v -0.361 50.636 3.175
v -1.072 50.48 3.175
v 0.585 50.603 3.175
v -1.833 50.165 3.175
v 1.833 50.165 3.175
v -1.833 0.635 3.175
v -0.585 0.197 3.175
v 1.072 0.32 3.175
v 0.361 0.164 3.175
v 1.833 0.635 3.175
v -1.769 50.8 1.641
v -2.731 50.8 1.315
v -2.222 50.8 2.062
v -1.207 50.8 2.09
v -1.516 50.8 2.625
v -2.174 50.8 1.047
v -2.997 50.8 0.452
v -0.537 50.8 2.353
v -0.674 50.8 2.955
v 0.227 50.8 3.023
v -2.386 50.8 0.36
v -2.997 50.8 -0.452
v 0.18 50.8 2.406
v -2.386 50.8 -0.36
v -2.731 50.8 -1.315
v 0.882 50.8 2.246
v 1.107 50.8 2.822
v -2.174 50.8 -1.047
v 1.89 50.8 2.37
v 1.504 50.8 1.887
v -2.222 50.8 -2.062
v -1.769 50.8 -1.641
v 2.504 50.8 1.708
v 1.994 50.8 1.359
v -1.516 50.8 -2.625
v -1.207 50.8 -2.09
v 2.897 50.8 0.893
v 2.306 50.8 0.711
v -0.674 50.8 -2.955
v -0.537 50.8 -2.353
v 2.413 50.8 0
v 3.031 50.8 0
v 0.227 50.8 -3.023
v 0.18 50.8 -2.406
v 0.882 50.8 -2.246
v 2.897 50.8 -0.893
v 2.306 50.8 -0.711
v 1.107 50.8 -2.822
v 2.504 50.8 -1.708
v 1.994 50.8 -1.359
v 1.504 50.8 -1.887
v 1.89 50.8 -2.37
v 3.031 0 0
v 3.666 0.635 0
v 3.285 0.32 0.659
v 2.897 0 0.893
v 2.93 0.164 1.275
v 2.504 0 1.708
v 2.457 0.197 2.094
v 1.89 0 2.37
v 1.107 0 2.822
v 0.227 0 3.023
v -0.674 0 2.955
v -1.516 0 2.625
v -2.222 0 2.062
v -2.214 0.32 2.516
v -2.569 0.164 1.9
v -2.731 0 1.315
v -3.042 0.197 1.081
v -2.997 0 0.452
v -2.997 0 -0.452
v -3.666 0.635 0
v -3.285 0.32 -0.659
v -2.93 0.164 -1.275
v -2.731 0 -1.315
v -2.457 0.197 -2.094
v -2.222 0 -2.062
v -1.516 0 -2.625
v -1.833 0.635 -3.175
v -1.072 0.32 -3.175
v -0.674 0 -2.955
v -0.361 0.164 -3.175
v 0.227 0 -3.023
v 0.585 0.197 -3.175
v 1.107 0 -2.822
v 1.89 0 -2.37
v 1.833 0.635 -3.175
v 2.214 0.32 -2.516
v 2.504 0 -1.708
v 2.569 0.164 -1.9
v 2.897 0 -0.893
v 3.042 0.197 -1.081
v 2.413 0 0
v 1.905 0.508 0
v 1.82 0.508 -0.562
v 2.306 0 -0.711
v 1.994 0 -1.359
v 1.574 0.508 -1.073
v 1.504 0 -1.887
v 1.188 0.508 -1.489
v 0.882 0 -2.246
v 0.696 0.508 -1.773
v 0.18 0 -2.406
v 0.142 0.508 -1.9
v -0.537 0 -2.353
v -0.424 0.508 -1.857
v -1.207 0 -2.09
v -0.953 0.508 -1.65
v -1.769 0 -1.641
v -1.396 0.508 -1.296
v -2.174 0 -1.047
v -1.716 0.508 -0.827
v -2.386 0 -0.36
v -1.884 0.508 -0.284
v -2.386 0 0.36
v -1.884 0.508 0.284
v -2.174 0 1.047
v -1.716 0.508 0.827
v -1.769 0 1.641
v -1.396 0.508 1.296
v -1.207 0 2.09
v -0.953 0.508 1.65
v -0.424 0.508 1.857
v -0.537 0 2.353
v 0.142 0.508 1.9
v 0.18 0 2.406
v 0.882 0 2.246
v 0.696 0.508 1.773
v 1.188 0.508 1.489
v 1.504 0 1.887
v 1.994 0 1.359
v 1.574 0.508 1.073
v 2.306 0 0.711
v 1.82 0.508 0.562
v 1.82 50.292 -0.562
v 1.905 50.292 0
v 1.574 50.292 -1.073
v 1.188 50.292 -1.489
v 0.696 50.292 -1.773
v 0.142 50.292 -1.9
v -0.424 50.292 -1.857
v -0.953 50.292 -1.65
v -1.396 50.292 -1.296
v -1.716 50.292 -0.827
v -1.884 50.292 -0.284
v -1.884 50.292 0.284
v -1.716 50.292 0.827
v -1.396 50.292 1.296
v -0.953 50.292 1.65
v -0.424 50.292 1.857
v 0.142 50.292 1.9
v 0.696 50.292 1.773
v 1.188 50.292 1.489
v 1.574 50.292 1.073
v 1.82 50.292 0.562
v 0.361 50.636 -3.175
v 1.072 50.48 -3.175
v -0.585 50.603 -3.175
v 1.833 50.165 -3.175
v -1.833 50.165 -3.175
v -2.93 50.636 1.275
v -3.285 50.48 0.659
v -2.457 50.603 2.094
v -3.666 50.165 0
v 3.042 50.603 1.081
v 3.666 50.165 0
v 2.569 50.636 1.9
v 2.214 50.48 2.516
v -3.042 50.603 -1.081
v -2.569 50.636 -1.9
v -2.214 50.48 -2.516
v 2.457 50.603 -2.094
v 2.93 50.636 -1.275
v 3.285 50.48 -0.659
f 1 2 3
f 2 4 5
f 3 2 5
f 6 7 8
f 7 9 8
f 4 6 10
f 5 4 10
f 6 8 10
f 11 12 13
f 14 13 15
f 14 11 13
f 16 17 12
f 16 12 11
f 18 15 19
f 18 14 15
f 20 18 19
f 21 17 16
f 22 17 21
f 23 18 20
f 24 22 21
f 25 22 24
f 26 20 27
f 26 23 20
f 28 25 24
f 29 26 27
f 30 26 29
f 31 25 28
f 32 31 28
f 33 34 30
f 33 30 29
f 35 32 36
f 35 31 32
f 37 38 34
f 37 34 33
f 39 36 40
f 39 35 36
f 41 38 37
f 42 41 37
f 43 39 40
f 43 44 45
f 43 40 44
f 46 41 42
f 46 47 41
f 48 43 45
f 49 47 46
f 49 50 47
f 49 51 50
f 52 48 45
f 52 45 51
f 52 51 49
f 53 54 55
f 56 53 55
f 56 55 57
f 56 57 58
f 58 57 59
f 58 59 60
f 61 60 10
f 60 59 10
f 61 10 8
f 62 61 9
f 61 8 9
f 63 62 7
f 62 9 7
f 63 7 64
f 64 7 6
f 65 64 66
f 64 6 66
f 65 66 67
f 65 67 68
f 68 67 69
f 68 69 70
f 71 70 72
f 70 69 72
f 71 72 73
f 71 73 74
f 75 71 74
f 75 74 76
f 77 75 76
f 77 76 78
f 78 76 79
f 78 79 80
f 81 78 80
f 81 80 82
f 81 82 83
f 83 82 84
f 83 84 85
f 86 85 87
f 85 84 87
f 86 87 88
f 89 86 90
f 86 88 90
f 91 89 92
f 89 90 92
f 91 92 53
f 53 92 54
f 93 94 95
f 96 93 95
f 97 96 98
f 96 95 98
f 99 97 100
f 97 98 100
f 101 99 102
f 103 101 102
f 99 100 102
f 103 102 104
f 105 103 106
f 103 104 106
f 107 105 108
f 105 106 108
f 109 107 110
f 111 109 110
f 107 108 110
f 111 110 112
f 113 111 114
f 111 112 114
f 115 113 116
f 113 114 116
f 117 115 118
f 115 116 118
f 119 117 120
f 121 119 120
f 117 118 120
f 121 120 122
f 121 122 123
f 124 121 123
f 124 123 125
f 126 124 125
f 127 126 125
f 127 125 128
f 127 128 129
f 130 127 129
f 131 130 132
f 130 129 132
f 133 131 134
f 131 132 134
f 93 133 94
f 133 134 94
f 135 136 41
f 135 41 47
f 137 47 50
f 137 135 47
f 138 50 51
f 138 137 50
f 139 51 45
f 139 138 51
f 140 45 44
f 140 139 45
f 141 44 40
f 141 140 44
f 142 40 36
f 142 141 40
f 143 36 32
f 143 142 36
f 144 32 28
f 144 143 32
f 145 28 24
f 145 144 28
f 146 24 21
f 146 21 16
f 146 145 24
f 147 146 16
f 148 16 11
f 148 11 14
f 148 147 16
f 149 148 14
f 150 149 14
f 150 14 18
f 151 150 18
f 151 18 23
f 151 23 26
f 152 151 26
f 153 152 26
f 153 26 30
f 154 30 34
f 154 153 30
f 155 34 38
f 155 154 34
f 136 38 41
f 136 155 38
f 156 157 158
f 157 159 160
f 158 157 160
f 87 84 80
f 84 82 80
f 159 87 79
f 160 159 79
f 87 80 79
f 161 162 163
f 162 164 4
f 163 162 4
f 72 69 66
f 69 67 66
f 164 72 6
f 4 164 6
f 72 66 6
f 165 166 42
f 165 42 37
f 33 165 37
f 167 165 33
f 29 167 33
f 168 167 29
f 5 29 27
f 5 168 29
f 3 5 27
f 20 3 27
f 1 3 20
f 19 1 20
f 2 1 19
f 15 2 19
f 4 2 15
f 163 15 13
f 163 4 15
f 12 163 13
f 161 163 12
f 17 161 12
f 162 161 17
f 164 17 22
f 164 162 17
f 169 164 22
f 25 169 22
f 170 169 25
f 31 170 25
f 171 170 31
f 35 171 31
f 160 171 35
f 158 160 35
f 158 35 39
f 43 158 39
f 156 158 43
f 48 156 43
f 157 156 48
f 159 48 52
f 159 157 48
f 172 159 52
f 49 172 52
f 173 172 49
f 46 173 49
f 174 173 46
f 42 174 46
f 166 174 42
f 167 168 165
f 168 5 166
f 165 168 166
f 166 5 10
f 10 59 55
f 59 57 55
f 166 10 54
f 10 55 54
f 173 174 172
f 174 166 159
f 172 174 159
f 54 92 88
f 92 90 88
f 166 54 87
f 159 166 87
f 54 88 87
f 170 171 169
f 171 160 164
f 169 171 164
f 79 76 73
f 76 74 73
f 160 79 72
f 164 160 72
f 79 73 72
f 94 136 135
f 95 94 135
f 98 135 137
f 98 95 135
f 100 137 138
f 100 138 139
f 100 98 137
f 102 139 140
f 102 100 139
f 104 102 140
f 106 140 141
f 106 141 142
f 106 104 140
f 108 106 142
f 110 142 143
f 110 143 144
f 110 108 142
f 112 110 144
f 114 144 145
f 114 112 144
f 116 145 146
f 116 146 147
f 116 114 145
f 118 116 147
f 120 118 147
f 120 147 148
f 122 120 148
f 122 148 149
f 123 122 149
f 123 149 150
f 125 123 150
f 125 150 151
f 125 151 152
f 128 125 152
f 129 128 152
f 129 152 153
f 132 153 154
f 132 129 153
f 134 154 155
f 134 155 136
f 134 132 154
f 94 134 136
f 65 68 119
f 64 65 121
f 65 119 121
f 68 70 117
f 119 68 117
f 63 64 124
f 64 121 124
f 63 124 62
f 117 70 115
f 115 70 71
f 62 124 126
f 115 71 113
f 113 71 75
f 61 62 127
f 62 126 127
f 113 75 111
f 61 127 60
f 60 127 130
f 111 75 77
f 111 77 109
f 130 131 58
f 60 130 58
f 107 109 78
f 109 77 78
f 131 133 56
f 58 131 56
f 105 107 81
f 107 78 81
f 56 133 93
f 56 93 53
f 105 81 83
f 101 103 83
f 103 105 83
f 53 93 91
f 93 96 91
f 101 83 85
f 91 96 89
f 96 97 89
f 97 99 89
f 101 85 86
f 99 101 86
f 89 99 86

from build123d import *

# Parameters (mm, degrees)
SKETCH1_R           = 1.905
BOSS_EXTRUDE1_DEPTH = 50.8
CHAMFER1_SIZE       = 0.508


with BuildPart() as part:
    # Sketch1 → Boss-Extrude1 (new body)
    with BuildSketch(Plane(origin=(0, 0, 0), x_dir=(1, 0, 0), z_dir=(0, 1, 0))):
        Polygon((3.666174209, 0), (1.833087105, 3.175), (-1.833087105, 3.175), (-3.666174209, 0), (-1.833087105, -3.175), (1.833087105, -3.175), align=None)
        Circle(SKETCH1_R, mode=Mode.SUBTRACT)
    extrude(amount=BOSS_EXTRUDE1_DEPTH)

    # Sketch2 → Cut-Revolve1 (revolve, cut)
    with BuildSketch(Plane.XY):
        Polygon((3.666174209, 0), (3.031174209, 0), (3.950242751, 0.919068541), align=None)
        Polygon((3.950242751, 49.880931459), (3.666174209, 50.8), (3.031174209, 50.8), align=None)
    revolve(axis=Axis((0, 49.880931459, 0), (0, -1, 0)), mode=Mode.SUBTRACT)

    # Chamfer1
    chamfer1_edges = [part.edges().sort_by_distance(p)[0] for p in [
        (-1.905, 0, 0),
        (-1.905, 50.8, 0),
    ]]
    chamfer(chamfer1_edges, length=CHAMFER1_SIZE)


solid = part.part
